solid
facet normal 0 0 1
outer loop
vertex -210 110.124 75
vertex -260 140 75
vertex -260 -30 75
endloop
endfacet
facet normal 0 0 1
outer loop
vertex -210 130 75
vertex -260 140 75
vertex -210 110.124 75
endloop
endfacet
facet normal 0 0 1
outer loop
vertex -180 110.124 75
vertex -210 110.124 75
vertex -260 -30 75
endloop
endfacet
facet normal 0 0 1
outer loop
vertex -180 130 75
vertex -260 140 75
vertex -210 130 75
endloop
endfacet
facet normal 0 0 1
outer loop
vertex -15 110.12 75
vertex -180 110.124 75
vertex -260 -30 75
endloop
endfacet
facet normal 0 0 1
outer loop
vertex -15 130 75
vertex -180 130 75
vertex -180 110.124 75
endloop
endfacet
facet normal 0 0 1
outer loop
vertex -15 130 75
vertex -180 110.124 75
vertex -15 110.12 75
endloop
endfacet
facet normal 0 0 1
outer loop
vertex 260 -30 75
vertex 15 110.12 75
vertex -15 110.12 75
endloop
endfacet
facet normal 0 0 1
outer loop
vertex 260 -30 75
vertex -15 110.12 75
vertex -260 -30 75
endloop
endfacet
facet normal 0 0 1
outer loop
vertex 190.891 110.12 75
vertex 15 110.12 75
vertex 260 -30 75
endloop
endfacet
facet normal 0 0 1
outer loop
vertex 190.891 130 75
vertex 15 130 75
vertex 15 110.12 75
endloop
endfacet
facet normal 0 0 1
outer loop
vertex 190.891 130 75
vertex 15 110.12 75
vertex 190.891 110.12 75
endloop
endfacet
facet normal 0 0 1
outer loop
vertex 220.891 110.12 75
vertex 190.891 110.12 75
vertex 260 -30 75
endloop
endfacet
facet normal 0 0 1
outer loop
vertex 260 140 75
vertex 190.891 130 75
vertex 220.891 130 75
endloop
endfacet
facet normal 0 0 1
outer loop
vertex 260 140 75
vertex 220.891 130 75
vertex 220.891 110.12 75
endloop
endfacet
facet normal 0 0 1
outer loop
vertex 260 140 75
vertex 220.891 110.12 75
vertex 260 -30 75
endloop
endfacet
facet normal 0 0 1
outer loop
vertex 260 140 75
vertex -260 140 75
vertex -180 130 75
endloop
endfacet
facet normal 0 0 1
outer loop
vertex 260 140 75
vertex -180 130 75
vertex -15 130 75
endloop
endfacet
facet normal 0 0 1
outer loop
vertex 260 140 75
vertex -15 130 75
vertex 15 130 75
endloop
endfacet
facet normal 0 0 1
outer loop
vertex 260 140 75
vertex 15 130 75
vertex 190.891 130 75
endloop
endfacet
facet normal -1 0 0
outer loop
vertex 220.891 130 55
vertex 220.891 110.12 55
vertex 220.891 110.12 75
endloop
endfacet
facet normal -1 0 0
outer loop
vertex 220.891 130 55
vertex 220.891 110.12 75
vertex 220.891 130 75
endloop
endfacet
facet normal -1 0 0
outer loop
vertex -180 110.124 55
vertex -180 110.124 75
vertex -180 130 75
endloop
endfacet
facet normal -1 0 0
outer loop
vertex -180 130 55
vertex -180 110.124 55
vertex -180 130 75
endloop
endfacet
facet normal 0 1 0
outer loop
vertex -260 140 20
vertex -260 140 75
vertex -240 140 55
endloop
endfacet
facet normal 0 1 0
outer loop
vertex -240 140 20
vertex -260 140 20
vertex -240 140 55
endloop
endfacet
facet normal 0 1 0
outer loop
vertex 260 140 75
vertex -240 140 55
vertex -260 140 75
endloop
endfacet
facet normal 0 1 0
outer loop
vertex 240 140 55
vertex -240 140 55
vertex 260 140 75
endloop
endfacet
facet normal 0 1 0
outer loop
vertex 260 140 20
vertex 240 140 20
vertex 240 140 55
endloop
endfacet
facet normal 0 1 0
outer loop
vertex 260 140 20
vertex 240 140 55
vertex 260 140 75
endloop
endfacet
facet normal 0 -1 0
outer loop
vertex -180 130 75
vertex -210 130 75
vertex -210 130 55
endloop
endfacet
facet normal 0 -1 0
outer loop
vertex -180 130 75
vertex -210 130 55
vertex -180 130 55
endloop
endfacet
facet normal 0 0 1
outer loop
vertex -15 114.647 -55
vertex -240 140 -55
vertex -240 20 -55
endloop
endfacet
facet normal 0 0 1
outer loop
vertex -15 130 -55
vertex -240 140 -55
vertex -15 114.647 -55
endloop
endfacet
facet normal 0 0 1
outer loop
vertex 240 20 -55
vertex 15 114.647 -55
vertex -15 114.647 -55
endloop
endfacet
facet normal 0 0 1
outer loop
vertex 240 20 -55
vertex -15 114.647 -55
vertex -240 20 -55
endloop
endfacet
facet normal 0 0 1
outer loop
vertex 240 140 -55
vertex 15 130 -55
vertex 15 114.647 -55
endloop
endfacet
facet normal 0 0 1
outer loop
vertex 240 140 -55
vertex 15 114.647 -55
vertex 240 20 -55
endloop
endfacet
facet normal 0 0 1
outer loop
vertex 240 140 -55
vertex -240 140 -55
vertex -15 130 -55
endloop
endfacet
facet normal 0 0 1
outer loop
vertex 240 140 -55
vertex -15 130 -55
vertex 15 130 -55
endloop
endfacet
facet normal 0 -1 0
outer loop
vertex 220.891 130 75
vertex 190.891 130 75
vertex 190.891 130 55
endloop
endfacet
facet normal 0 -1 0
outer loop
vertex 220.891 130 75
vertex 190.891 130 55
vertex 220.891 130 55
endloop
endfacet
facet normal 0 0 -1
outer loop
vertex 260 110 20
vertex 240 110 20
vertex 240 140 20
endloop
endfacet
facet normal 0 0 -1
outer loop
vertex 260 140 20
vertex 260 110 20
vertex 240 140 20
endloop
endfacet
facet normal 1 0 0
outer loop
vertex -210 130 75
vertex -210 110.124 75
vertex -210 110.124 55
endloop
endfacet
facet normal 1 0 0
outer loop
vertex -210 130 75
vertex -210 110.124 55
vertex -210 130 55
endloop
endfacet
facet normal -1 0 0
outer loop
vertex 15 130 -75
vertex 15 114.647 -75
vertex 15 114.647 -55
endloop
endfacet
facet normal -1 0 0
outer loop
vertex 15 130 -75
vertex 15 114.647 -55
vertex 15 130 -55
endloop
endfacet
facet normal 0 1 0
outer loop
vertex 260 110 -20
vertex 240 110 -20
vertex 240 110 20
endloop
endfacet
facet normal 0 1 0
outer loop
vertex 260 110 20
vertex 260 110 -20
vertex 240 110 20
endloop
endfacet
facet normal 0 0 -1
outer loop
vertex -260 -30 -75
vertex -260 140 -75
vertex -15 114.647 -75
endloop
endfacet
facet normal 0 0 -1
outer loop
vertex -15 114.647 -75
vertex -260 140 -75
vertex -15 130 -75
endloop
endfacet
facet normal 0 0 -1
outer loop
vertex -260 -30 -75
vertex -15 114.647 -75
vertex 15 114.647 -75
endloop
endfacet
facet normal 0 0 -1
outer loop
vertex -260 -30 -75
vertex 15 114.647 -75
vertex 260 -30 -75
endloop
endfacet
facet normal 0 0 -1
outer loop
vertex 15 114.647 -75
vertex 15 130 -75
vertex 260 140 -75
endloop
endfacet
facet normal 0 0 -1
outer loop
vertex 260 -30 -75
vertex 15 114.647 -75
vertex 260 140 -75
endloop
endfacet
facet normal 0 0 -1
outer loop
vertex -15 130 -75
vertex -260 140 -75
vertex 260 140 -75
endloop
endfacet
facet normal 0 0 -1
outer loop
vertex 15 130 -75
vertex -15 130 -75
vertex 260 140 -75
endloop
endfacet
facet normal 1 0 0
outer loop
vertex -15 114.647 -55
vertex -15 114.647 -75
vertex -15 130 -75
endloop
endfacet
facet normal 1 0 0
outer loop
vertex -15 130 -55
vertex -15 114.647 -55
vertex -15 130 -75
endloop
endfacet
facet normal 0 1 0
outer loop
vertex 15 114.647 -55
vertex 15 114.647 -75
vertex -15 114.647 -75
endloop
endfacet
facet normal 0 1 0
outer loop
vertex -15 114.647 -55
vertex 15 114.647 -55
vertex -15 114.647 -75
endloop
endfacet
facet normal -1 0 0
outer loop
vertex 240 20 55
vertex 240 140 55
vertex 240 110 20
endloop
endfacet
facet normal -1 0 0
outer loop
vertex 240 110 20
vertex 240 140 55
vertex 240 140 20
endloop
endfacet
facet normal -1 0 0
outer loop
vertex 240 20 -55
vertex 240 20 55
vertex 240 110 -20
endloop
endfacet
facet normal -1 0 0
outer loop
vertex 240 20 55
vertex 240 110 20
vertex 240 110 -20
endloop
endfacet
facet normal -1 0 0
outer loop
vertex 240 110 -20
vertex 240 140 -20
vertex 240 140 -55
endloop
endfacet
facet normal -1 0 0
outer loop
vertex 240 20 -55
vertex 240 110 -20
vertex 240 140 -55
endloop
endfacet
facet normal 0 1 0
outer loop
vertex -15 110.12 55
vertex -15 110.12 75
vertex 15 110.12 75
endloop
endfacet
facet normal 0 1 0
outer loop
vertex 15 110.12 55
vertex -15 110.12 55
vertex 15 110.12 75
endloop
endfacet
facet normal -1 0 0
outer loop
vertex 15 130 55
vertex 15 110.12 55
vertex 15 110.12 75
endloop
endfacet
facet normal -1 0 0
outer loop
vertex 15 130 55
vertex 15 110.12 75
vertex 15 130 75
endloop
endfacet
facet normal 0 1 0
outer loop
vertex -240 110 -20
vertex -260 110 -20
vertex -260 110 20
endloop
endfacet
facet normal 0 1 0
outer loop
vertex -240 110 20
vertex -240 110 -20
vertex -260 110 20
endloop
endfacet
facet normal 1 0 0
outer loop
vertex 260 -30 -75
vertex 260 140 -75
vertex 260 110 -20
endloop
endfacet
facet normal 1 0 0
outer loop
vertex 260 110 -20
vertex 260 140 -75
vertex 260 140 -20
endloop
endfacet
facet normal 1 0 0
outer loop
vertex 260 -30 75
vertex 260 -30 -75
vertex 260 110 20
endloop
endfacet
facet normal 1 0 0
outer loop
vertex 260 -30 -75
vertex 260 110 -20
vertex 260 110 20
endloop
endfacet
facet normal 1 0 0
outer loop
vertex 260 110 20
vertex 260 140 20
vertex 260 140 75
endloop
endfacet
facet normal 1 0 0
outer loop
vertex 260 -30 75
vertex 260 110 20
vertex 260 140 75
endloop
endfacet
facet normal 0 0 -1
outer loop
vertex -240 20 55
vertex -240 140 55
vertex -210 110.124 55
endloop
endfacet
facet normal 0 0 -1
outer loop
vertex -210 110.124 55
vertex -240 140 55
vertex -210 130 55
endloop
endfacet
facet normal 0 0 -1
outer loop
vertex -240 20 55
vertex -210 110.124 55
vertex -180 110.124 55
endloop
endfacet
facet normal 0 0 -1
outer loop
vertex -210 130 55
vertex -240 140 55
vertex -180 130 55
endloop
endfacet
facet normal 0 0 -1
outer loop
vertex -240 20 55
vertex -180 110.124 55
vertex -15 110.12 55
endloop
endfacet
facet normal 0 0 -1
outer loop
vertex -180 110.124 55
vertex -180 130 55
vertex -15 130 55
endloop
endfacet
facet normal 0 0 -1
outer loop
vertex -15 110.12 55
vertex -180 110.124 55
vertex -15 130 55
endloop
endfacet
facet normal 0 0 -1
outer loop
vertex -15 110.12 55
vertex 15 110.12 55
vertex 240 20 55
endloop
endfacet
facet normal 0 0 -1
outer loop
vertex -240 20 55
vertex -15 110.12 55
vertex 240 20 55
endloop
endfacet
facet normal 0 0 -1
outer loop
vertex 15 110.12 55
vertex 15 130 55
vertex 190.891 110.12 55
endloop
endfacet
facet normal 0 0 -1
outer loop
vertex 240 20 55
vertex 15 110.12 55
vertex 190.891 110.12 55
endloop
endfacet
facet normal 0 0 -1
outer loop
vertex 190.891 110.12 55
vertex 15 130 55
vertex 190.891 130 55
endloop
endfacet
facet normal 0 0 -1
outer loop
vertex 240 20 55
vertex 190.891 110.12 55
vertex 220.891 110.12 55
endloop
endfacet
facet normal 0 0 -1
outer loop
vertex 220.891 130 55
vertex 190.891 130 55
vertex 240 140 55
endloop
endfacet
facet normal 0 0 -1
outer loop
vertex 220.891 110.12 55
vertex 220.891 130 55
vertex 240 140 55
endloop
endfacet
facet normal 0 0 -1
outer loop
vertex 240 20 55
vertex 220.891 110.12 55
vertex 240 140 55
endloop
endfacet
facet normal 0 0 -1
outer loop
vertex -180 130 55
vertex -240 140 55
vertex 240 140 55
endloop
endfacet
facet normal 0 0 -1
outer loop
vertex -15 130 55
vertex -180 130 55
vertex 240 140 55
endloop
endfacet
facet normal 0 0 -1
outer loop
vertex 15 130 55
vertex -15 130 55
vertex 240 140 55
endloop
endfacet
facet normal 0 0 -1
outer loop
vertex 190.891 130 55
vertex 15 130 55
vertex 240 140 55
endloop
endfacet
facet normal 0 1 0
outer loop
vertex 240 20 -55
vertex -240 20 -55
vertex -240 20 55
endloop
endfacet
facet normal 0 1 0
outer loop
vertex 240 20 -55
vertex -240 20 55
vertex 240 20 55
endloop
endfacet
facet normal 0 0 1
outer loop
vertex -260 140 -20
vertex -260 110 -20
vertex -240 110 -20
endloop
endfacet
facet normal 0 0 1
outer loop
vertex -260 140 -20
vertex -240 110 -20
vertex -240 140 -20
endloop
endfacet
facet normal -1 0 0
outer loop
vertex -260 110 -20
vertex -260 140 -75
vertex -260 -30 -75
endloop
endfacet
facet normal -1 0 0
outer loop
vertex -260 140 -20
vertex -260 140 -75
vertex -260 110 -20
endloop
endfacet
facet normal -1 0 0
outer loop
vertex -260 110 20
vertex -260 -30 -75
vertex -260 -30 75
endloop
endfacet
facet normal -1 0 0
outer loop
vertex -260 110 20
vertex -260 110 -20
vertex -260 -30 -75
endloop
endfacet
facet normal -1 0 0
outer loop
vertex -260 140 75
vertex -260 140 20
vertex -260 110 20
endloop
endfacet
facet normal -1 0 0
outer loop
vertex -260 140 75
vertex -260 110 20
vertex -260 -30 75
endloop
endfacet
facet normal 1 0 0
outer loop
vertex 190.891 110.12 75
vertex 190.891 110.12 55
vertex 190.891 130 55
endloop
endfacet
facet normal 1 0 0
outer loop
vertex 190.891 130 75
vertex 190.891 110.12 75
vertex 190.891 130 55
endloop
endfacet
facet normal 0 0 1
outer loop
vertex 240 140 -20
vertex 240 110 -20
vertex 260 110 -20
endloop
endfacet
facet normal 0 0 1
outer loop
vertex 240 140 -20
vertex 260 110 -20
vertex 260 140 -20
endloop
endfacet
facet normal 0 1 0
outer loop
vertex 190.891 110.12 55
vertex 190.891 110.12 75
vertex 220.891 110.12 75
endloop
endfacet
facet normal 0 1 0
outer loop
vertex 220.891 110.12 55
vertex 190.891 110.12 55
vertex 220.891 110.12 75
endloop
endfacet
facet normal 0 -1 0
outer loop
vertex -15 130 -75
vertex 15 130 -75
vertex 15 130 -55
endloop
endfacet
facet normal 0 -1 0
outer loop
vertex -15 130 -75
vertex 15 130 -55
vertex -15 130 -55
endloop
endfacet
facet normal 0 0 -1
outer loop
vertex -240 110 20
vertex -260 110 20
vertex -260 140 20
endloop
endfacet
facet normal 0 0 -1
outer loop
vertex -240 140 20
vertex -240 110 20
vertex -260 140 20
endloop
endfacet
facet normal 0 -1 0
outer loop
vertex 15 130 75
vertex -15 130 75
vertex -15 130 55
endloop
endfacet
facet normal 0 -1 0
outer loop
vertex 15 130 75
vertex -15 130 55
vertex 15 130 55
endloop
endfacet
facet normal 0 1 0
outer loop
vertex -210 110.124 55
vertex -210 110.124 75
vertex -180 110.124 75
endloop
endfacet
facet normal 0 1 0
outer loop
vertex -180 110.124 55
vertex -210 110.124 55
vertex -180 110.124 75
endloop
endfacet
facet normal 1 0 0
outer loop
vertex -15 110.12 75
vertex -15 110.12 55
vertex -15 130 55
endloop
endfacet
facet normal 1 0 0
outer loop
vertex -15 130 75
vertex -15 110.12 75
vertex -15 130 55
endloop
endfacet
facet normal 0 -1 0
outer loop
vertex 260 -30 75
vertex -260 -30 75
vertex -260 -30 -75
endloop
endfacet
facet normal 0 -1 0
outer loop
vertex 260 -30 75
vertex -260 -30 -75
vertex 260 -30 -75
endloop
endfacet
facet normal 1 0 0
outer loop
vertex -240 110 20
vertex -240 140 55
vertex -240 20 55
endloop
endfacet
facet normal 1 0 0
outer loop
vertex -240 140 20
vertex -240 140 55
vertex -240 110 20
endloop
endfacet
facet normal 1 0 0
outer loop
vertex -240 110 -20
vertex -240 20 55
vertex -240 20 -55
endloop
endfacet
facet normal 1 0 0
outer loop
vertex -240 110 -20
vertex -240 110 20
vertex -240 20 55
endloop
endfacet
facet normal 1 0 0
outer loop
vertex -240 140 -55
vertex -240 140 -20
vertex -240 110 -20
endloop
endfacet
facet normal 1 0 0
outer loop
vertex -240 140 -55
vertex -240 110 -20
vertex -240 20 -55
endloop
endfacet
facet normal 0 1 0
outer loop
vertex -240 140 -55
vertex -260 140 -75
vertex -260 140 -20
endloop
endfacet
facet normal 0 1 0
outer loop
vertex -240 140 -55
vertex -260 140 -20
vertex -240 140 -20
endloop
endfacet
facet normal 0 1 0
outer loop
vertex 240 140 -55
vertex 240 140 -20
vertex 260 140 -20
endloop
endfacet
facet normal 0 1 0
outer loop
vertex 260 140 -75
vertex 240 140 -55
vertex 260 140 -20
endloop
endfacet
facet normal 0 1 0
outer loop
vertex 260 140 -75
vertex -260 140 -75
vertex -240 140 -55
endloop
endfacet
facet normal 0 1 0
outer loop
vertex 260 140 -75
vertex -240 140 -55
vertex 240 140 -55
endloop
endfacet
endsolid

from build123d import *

# Parameters (mm, degrees)
SKETCH_1_W           = 520
SKETCH_1_H           = 150
EXTRUDE_1_DEPTH      = 140
SKETCH_2_W           = 480
SKETCH_2_H           = 110
CUT_EXTRUDE_1_DEPTH  = 120
SKETCH_11_W          = 40
SKETCH_11_H          = 30
CUT_EXTRUDE_3_DEPTH  = 544.714079273
SKETCH_13_W          = 520
SKETCH_13_H          = 150
EXTRUDE_6_DEPTH      = 30
SKETCH_18_W          = 30
SKETCH_18_H          = 15.352958973
CUT_EXTRUDE_8_DEPTH  = 30
SKETCH_21_W          = 30
SKETCH_21_H          = 19.875616275
CUT_EXTRUDE_9_DEPTH  = 30
SKETCH_22_W          = 30
SKETCH_22_H          = 19.88
CUT_EXTRUDE_10_DEPTH = 30
SKETCH_25_W          = 30
SKETCH_25_H          = 19.88
CUT_EXTRUDE_12_DEPTH = 30


with BuildPart() as part:
    # 草圖1 → 填料-伸長1 (new body)
    with BuildSketch(Plane(origin=(0, 0, 0), x_dir=(1, 0, 0), z_dir=(0, 1, 0))):
        Rectangle(SKETCH_1_W, SKETCH_1_H)
    extrude(amount=EXTRUDE_1_DEPTH)

    # 草圖2 → 除料-伸長1 (cut)
    with BuildSketch(Plane(origin=(0, 140, 0), x_dir=(1, 0, 0), z_dir=(0, 1, 0))):
        Rectangle(SKETCH_2_W, SKETCH_2_H)
    extrude(amount=-CUT_EXTRUDE_1_DEPTH, mode=Mode.SUBTRACT)

    # 草圖11 → 除料-伸長3 (cut, through all)
    with BuildSketch(Plane.ZY.offset(260)):
        with Locations((0, 125)):
            Rectangle(SKETCH_11_W, SKETCH_11_H)
    extrude(amount=-CUT_EXTRUDE_3_DEPTH, mode=Mode.SUBTRACT)

    # 草圖13 → 填料-伸長6 (add)
    with BuildSketch(Plane.XZ):
        Rectangle(SKETCH_13_W, SKETCH_13_H)
    extrude(amount=EXTRUDE_6_DEPTH)

    # 草圖18 → 除料-伸長8 (cut)
    with BuildSketch(Plane(origin=(0, 0, -75), x_dir=(-1, 0, 0), z_dir=(0, 0, -1))):
        with Locations((0, 122.323520514)):
            Rectangle(SKETCH_18_W, SKETCH_18_H)
    extrude(amount=-CUT_EXTRUDE_8_DEPTH, mode=Mode.SUBTRACT)

    # 草圖21 → 除料-伸長9 (cut)
    with BuildSketch(Plane.XY.offset(75)):
        with Locations((-195, 120.062191863)):
            Rectangle(SKETCH_21_W, SKETCH_21_H)
    extrude(amount=-CUT_EXTRUDE_9_DEPTH, mode=Mode.SUBTRACT)

    # 草圖22 → 除料-伸長10 (cut)
    with BuildSketch(Plane.XY.offset(75)):
        with Locations((0, 120.06)):
            Rectangle(SKETCH_22_W, SKETCH_22_H)
    extrude(amount=-CUT_EXTRUDE_10_DEPTH, mode=Mode.SUBTRACT)

    # 草圖25 → 除料-伸長12 (cut)
    with BuildSketch(Plane.XY.offset(75)):
        with Locations((205.891066665, 120.06)):
            Rectangle(SKETCH_25_W, SKETCH_25_H)
    extrude(amount=-CUT_EXTRUDE_12_DEPTH, mode=Mode.SUBTRACT)


solid = part.part
